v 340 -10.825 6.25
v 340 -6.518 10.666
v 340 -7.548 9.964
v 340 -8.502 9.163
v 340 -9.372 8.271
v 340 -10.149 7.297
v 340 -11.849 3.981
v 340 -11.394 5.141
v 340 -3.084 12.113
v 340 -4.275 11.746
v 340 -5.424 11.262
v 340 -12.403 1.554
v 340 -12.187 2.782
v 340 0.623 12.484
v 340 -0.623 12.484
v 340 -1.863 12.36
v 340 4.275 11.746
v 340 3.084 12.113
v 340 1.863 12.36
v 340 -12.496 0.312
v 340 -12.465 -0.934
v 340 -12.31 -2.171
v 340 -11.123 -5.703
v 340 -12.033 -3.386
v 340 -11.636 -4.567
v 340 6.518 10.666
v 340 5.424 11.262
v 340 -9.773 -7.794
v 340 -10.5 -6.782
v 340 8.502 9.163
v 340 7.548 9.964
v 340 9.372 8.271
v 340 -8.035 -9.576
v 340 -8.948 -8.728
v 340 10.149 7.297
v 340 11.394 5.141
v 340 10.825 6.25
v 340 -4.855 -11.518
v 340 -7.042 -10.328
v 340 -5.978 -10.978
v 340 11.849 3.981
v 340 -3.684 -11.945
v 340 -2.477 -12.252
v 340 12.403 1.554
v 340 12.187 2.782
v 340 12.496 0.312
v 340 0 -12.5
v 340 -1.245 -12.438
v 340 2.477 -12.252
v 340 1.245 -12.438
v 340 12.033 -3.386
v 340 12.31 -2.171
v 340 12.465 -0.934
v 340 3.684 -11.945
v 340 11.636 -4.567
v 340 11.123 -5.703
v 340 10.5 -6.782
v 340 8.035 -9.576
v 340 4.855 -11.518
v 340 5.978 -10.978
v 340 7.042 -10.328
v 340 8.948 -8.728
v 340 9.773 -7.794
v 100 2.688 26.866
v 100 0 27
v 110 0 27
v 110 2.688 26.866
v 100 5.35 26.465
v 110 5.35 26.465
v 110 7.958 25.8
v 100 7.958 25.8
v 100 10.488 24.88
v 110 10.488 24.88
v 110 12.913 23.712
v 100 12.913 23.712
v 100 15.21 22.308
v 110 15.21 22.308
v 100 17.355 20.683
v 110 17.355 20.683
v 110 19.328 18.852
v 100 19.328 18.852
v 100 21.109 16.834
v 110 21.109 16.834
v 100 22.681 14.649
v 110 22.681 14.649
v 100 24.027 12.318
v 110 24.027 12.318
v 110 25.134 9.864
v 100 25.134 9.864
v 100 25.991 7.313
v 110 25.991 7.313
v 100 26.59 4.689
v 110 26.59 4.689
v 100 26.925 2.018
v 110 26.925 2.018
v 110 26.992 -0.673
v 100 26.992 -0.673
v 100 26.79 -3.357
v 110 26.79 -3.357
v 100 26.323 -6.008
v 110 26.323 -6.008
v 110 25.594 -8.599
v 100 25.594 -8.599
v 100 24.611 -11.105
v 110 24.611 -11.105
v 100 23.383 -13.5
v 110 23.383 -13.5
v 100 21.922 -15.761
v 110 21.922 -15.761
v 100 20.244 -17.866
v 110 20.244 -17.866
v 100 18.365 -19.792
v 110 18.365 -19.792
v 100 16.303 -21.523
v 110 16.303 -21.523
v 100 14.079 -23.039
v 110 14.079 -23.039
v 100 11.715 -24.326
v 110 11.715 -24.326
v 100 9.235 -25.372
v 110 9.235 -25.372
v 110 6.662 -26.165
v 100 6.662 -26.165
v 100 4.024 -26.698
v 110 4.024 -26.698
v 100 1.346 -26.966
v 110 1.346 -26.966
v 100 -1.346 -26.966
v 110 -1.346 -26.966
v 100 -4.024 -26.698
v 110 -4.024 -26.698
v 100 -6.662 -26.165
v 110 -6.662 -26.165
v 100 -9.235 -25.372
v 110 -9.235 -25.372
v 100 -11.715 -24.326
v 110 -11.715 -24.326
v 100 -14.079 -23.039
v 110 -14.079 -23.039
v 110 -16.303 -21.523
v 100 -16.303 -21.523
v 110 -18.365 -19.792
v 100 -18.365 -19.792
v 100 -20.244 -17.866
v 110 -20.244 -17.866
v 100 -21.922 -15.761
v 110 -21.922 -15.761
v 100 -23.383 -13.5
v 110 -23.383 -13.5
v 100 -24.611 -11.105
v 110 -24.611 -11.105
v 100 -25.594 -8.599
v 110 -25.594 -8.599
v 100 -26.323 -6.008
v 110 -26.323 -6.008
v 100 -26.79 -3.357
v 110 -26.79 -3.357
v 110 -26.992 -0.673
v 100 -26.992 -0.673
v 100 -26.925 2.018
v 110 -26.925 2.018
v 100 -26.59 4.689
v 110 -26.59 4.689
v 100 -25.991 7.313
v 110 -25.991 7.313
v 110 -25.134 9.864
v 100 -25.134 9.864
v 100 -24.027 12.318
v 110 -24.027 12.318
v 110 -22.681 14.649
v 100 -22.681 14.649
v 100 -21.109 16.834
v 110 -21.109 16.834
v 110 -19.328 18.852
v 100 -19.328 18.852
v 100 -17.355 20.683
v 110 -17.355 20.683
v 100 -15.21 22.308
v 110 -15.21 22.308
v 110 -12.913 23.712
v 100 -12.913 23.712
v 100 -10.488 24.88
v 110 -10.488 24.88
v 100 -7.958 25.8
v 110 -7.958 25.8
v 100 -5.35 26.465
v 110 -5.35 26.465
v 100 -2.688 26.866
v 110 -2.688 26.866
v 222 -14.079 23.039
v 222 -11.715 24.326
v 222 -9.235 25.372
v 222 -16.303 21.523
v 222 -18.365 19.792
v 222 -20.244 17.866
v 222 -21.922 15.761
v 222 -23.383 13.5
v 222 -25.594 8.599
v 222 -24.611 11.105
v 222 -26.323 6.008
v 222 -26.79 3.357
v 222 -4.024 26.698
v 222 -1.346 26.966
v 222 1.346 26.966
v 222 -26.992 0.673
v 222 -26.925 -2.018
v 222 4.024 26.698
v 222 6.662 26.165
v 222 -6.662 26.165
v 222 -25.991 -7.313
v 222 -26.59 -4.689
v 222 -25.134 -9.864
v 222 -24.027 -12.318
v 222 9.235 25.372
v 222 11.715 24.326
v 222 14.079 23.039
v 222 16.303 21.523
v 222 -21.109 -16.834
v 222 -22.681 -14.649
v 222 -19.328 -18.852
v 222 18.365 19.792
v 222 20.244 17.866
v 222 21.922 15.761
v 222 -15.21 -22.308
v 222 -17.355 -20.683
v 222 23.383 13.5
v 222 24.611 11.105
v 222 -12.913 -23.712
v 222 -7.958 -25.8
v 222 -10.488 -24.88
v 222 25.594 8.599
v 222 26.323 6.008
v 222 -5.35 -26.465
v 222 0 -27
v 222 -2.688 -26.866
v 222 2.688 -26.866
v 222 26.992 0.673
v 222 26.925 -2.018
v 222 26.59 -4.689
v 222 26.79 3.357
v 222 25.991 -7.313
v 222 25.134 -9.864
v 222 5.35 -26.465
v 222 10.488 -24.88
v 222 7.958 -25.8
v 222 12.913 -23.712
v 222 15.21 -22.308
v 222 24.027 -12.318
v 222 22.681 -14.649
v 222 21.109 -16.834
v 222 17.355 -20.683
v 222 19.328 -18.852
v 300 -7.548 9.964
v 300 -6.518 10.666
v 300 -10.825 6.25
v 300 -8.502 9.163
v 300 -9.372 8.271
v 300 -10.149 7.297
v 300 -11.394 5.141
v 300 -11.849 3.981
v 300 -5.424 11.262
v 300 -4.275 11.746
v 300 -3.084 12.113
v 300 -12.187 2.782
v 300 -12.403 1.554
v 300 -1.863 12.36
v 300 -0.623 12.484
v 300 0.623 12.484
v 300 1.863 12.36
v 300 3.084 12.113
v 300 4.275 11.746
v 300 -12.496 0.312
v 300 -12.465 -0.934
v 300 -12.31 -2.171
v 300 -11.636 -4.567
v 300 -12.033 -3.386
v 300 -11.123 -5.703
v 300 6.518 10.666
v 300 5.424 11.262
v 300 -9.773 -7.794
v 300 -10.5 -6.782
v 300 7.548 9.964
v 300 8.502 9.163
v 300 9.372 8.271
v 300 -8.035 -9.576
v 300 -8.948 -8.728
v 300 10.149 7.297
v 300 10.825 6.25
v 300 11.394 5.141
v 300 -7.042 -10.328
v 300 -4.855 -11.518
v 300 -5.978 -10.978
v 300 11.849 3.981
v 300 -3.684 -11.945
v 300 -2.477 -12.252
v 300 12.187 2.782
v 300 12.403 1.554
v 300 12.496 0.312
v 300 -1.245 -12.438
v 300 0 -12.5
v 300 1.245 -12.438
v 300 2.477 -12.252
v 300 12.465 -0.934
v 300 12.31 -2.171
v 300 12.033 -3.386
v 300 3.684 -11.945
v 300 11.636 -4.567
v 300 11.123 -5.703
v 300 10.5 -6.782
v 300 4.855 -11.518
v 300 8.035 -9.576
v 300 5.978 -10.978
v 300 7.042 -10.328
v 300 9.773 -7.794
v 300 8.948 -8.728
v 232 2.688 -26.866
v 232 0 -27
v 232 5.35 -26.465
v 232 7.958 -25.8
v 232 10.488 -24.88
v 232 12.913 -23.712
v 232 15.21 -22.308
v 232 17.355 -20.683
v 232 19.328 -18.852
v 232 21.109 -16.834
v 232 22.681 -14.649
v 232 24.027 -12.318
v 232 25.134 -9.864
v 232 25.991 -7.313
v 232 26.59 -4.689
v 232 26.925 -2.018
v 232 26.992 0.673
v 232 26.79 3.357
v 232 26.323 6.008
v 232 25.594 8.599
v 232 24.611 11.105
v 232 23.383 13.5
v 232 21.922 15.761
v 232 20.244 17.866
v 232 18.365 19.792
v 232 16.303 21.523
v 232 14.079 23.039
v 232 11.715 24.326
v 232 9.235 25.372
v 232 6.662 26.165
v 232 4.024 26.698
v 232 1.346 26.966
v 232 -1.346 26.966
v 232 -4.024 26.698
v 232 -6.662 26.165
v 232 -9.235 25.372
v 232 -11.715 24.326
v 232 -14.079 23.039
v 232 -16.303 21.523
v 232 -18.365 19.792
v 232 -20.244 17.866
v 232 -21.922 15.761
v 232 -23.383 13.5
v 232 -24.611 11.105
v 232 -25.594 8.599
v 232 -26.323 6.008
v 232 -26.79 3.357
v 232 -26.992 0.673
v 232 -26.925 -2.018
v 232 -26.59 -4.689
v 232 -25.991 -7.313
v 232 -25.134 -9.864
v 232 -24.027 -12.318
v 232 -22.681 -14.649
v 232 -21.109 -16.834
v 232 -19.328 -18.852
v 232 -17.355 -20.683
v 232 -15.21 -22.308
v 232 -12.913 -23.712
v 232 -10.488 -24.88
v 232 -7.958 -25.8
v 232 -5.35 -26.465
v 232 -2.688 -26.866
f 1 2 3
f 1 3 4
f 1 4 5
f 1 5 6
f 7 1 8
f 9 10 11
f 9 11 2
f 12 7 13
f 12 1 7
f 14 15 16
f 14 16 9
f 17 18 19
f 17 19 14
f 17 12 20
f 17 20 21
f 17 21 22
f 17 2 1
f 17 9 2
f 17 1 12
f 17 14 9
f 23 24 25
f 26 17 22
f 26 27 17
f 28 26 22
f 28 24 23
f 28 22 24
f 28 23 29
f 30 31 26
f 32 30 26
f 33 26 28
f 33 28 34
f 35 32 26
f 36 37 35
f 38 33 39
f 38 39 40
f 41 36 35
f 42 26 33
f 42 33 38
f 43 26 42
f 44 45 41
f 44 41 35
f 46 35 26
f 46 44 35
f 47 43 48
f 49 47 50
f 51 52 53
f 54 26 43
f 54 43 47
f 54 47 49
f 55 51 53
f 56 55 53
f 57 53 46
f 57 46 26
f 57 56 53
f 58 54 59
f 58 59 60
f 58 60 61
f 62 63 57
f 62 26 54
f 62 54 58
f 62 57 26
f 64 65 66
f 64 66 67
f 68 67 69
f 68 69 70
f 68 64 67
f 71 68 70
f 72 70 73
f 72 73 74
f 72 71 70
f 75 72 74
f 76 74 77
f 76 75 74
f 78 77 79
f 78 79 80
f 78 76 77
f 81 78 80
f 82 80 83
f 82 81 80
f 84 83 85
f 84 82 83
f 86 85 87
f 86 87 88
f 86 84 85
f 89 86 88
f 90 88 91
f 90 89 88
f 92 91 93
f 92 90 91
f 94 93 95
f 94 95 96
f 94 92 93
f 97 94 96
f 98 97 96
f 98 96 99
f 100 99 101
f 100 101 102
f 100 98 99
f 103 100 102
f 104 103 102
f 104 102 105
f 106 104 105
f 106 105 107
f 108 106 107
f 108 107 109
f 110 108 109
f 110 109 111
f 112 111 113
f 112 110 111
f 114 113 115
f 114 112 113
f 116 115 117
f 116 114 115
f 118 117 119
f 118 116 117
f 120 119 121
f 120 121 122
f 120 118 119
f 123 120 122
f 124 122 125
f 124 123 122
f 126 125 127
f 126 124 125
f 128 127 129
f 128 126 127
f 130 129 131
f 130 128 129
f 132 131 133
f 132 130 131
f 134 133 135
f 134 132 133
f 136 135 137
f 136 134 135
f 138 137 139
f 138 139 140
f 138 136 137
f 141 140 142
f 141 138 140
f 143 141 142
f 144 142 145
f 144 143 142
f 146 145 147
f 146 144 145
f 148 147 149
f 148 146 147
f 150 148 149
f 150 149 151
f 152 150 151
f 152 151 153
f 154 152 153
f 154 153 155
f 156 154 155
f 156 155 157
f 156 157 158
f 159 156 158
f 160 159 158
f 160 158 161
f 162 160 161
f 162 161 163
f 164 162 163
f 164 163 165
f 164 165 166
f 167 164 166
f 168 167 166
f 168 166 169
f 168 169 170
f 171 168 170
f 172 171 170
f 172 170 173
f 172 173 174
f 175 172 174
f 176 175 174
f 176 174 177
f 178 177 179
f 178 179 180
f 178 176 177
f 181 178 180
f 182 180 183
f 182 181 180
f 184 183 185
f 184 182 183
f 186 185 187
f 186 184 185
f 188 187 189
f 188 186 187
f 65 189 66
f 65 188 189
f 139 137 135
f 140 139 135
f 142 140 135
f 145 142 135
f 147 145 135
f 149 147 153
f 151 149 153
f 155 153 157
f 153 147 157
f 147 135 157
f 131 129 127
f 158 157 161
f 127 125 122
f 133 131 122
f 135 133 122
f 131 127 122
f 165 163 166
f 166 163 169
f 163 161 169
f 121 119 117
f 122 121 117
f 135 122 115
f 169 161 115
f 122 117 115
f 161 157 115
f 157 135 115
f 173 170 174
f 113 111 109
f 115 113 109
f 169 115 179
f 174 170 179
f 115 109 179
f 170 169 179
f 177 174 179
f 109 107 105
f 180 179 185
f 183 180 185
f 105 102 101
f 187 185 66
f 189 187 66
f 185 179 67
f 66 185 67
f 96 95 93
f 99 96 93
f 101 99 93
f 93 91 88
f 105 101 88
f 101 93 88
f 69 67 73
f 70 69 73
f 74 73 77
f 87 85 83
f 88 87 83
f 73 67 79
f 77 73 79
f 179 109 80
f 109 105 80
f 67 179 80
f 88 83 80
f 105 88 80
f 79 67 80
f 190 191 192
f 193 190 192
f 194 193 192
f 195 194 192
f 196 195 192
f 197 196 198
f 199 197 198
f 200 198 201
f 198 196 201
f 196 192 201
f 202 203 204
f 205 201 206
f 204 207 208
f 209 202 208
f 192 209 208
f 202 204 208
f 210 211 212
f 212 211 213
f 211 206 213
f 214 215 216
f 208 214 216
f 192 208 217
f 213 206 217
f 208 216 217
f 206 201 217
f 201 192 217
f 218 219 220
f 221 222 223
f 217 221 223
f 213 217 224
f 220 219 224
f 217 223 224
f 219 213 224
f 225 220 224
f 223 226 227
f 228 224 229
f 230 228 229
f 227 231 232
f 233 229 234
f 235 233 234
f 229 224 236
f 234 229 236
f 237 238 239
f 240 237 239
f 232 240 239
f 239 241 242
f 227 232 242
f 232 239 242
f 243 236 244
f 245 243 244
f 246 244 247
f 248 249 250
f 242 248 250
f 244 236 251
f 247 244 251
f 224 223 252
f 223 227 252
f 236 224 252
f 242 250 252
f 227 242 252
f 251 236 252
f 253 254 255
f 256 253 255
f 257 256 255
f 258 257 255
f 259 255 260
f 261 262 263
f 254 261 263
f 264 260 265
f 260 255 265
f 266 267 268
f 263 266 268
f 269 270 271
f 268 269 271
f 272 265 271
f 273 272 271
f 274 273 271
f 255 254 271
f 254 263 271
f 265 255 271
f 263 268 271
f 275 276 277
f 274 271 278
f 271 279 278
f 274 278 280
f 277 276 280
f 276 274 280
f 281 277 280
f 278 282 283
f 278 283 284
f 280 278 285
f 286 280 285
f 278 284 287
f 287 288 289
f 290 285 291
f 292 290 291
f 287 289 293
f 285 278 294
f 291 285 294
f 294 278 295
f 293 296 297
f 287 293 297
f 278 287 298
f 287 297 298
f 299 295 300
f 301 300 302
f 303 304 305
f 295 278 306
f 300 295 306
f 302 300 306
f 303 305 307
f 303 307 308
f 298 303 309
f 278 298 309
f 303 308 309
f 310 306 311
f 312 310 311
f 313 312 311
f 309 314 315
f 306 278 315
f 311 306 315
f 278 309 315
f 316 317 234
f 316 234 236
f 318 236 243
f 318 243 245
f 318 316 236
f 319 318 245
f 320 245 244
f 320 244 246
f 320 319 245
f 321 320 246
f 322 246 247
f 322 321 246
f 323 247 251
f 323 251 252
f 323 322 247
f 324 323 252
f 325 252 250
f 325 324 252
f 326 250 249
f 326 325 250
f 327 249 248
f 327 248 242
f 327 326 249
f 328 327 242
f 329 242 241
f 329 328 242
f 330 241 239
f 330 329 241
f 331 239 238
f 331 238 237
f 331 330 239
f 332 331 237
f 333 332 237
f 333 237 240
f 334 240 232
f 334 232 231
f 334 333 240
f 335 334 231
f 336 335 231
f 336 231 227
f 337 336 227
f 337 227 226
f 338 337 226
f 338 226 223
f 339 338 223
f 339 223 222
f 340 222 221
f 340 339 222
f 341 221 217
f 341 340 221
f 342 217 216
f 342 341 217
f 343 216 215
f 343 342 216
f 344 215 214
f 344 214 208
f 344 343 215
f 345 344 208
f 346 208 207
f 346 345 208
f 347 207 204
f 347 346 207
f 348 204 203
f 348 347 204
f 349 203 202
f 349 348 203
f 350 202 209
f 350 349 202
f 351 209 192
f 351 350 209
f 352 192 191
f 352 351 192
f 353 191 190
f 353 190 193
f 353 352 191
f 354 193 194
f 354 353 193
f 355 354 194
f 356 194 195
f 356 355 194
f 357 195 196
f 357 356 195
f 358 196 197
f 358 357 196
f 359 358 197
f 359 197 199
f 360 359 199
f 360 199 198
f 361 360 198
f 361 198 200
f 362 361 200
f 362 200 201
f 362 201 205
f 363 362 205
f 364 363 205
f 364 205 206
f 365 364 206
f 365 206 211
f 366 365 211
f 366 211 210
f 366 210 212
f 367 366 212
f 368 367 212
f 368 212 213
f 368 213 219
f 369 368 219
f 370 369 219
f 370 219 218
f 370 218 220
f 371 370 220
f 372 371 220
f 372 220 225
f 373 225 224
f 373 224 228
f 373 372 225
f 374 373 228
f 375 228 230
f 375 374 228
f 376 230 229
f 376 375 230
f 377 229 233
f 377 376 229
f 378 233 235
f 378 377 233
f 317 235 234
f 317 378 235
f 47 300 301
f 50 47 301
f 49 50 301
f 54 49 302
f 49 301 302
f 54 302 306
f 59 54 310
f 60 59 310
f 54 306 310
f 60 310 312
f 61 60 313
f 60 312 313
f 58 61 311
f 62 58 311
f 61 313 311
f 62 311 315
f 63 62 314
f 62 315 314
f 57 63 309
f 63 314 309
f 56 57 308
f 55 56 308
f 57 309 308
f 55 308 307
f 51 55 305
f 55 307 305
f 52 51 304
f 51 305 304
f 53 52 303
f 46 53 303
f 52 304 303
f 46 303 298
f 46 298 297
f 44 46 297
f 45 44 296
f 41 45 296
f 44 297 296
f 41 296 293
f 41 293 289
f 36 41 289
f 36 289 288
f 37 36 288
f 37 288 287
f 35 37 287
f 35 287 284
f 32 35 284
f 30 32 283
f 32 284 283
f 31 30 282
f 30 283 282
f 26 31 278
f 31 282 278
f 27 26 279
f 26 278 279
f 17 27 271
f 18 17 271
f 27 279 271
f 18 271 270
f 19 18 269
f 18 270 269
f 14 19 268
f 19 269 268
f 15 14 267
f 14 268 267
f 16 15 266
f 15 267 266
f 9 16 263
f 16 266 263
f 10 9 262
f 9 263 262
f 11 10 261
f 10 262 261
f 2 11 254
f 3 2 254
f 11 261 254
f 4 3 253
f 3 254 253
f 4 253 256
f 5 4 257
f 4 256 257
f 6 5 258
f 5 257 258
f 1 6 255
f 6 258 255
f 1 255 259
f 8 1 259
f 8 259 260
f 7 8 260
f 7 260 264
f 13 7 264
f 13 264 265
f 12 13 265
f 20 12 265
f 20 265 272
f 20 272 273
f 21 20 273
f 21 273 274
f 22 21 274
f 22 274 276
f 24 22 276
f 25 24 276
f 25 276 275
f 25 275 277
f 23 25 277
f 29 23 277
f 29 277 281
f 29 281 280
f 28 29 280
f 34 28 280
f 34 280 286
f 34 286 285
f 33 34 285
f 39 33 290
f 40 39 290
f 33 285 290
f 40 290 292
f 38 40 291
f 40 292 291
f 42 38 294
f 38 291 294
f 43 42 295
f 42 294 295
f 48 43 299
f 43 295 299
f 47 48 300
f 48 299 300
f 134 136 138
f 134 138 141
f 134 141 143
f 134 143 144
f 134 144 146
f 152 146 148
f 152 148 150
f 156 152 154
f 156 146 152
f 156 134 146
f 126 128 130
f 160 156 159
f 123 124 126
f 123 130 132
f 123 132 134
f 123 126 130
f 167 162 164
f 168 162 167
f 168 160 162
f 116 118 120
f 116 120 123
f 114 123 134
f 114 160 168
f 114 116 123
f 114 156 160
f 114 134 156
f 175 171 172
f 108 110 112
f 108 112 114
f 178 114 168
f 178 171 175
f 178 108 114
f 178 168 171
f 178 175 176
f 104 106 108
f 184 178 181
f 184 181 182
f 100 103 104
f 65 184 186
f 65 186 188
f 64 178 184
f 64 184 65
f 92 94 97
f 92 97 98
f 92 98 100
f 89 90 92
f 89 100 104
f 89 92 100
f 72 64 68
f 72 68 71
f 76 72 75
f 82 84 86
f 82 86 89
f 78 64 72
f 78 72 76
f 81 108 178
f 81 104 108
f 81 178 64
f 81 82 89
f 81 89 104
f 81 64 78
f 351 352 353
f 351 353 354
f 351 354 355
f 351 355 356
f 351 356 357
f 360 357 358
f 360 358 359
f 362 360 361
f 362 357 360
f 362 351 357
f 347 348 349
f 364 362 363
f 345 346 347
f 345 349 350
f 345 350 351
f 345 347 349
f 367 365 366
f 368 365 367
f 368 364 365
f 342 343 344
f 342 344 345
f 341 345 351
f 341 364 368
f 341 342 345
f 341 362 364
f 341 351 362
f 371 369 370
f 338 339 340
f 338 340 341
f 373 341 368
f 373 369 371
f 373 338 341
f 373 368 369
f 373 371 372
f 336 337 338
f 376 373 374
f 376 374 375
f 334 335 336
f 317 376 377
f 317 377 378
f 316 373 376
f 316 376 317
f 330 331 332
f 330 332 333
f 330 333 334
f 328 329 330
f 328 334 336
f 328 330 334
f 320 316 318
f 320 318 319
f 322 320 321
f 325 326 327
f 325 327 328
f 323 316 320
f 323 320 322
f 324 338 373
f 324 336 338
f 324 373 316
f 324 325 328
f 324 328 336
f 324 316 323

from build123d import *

# Parameters (mm, degrees)
SKETCH_1_R      = 12.5
EXTRUDE_1_DEPTH = 40
SKETCH_2_R      = 27
EXTRUDE_2_DEPTH = 10
SKETCH_3_R      = 27
EXTRUDE_3_DEPTH = 10


with BuildPart() as part:
    # 草图1 → 凸台-拉伸1 (new body)
    with BuildSketch(Plane(origin=(300, 0, 0), x_dir=(0, 0, -1), z_dir=(1, 0, 0))):
        Circle(SKETCH_1_R)
    extrude(amount=EXTRUDE_1_DEPTH)


with BuildPart() as body_2:
    # 草图2 → 凸台-拉伸2 (new body)
    with BuildSketch(Plane.ZY.offset(-100)):
        Circle(SKETCH_2_R)
    extrude(amount=-EXTRUDE_2_DEPTH)


with BuildPart() as body_3:
    # 草图3 → 凸台-拉伸3 (new body)
    with BuildSketch(Plane(origin=(232, 0, 0), x_dir=(0, 0, -1), z_dir=(1, 0, 0))):
        Circle(SKETCH_3_R)
    extrude(amount=-EXTRUDE_3_DEPTH)


solid = Compound([part.part, body_2.part, body_3.part])
